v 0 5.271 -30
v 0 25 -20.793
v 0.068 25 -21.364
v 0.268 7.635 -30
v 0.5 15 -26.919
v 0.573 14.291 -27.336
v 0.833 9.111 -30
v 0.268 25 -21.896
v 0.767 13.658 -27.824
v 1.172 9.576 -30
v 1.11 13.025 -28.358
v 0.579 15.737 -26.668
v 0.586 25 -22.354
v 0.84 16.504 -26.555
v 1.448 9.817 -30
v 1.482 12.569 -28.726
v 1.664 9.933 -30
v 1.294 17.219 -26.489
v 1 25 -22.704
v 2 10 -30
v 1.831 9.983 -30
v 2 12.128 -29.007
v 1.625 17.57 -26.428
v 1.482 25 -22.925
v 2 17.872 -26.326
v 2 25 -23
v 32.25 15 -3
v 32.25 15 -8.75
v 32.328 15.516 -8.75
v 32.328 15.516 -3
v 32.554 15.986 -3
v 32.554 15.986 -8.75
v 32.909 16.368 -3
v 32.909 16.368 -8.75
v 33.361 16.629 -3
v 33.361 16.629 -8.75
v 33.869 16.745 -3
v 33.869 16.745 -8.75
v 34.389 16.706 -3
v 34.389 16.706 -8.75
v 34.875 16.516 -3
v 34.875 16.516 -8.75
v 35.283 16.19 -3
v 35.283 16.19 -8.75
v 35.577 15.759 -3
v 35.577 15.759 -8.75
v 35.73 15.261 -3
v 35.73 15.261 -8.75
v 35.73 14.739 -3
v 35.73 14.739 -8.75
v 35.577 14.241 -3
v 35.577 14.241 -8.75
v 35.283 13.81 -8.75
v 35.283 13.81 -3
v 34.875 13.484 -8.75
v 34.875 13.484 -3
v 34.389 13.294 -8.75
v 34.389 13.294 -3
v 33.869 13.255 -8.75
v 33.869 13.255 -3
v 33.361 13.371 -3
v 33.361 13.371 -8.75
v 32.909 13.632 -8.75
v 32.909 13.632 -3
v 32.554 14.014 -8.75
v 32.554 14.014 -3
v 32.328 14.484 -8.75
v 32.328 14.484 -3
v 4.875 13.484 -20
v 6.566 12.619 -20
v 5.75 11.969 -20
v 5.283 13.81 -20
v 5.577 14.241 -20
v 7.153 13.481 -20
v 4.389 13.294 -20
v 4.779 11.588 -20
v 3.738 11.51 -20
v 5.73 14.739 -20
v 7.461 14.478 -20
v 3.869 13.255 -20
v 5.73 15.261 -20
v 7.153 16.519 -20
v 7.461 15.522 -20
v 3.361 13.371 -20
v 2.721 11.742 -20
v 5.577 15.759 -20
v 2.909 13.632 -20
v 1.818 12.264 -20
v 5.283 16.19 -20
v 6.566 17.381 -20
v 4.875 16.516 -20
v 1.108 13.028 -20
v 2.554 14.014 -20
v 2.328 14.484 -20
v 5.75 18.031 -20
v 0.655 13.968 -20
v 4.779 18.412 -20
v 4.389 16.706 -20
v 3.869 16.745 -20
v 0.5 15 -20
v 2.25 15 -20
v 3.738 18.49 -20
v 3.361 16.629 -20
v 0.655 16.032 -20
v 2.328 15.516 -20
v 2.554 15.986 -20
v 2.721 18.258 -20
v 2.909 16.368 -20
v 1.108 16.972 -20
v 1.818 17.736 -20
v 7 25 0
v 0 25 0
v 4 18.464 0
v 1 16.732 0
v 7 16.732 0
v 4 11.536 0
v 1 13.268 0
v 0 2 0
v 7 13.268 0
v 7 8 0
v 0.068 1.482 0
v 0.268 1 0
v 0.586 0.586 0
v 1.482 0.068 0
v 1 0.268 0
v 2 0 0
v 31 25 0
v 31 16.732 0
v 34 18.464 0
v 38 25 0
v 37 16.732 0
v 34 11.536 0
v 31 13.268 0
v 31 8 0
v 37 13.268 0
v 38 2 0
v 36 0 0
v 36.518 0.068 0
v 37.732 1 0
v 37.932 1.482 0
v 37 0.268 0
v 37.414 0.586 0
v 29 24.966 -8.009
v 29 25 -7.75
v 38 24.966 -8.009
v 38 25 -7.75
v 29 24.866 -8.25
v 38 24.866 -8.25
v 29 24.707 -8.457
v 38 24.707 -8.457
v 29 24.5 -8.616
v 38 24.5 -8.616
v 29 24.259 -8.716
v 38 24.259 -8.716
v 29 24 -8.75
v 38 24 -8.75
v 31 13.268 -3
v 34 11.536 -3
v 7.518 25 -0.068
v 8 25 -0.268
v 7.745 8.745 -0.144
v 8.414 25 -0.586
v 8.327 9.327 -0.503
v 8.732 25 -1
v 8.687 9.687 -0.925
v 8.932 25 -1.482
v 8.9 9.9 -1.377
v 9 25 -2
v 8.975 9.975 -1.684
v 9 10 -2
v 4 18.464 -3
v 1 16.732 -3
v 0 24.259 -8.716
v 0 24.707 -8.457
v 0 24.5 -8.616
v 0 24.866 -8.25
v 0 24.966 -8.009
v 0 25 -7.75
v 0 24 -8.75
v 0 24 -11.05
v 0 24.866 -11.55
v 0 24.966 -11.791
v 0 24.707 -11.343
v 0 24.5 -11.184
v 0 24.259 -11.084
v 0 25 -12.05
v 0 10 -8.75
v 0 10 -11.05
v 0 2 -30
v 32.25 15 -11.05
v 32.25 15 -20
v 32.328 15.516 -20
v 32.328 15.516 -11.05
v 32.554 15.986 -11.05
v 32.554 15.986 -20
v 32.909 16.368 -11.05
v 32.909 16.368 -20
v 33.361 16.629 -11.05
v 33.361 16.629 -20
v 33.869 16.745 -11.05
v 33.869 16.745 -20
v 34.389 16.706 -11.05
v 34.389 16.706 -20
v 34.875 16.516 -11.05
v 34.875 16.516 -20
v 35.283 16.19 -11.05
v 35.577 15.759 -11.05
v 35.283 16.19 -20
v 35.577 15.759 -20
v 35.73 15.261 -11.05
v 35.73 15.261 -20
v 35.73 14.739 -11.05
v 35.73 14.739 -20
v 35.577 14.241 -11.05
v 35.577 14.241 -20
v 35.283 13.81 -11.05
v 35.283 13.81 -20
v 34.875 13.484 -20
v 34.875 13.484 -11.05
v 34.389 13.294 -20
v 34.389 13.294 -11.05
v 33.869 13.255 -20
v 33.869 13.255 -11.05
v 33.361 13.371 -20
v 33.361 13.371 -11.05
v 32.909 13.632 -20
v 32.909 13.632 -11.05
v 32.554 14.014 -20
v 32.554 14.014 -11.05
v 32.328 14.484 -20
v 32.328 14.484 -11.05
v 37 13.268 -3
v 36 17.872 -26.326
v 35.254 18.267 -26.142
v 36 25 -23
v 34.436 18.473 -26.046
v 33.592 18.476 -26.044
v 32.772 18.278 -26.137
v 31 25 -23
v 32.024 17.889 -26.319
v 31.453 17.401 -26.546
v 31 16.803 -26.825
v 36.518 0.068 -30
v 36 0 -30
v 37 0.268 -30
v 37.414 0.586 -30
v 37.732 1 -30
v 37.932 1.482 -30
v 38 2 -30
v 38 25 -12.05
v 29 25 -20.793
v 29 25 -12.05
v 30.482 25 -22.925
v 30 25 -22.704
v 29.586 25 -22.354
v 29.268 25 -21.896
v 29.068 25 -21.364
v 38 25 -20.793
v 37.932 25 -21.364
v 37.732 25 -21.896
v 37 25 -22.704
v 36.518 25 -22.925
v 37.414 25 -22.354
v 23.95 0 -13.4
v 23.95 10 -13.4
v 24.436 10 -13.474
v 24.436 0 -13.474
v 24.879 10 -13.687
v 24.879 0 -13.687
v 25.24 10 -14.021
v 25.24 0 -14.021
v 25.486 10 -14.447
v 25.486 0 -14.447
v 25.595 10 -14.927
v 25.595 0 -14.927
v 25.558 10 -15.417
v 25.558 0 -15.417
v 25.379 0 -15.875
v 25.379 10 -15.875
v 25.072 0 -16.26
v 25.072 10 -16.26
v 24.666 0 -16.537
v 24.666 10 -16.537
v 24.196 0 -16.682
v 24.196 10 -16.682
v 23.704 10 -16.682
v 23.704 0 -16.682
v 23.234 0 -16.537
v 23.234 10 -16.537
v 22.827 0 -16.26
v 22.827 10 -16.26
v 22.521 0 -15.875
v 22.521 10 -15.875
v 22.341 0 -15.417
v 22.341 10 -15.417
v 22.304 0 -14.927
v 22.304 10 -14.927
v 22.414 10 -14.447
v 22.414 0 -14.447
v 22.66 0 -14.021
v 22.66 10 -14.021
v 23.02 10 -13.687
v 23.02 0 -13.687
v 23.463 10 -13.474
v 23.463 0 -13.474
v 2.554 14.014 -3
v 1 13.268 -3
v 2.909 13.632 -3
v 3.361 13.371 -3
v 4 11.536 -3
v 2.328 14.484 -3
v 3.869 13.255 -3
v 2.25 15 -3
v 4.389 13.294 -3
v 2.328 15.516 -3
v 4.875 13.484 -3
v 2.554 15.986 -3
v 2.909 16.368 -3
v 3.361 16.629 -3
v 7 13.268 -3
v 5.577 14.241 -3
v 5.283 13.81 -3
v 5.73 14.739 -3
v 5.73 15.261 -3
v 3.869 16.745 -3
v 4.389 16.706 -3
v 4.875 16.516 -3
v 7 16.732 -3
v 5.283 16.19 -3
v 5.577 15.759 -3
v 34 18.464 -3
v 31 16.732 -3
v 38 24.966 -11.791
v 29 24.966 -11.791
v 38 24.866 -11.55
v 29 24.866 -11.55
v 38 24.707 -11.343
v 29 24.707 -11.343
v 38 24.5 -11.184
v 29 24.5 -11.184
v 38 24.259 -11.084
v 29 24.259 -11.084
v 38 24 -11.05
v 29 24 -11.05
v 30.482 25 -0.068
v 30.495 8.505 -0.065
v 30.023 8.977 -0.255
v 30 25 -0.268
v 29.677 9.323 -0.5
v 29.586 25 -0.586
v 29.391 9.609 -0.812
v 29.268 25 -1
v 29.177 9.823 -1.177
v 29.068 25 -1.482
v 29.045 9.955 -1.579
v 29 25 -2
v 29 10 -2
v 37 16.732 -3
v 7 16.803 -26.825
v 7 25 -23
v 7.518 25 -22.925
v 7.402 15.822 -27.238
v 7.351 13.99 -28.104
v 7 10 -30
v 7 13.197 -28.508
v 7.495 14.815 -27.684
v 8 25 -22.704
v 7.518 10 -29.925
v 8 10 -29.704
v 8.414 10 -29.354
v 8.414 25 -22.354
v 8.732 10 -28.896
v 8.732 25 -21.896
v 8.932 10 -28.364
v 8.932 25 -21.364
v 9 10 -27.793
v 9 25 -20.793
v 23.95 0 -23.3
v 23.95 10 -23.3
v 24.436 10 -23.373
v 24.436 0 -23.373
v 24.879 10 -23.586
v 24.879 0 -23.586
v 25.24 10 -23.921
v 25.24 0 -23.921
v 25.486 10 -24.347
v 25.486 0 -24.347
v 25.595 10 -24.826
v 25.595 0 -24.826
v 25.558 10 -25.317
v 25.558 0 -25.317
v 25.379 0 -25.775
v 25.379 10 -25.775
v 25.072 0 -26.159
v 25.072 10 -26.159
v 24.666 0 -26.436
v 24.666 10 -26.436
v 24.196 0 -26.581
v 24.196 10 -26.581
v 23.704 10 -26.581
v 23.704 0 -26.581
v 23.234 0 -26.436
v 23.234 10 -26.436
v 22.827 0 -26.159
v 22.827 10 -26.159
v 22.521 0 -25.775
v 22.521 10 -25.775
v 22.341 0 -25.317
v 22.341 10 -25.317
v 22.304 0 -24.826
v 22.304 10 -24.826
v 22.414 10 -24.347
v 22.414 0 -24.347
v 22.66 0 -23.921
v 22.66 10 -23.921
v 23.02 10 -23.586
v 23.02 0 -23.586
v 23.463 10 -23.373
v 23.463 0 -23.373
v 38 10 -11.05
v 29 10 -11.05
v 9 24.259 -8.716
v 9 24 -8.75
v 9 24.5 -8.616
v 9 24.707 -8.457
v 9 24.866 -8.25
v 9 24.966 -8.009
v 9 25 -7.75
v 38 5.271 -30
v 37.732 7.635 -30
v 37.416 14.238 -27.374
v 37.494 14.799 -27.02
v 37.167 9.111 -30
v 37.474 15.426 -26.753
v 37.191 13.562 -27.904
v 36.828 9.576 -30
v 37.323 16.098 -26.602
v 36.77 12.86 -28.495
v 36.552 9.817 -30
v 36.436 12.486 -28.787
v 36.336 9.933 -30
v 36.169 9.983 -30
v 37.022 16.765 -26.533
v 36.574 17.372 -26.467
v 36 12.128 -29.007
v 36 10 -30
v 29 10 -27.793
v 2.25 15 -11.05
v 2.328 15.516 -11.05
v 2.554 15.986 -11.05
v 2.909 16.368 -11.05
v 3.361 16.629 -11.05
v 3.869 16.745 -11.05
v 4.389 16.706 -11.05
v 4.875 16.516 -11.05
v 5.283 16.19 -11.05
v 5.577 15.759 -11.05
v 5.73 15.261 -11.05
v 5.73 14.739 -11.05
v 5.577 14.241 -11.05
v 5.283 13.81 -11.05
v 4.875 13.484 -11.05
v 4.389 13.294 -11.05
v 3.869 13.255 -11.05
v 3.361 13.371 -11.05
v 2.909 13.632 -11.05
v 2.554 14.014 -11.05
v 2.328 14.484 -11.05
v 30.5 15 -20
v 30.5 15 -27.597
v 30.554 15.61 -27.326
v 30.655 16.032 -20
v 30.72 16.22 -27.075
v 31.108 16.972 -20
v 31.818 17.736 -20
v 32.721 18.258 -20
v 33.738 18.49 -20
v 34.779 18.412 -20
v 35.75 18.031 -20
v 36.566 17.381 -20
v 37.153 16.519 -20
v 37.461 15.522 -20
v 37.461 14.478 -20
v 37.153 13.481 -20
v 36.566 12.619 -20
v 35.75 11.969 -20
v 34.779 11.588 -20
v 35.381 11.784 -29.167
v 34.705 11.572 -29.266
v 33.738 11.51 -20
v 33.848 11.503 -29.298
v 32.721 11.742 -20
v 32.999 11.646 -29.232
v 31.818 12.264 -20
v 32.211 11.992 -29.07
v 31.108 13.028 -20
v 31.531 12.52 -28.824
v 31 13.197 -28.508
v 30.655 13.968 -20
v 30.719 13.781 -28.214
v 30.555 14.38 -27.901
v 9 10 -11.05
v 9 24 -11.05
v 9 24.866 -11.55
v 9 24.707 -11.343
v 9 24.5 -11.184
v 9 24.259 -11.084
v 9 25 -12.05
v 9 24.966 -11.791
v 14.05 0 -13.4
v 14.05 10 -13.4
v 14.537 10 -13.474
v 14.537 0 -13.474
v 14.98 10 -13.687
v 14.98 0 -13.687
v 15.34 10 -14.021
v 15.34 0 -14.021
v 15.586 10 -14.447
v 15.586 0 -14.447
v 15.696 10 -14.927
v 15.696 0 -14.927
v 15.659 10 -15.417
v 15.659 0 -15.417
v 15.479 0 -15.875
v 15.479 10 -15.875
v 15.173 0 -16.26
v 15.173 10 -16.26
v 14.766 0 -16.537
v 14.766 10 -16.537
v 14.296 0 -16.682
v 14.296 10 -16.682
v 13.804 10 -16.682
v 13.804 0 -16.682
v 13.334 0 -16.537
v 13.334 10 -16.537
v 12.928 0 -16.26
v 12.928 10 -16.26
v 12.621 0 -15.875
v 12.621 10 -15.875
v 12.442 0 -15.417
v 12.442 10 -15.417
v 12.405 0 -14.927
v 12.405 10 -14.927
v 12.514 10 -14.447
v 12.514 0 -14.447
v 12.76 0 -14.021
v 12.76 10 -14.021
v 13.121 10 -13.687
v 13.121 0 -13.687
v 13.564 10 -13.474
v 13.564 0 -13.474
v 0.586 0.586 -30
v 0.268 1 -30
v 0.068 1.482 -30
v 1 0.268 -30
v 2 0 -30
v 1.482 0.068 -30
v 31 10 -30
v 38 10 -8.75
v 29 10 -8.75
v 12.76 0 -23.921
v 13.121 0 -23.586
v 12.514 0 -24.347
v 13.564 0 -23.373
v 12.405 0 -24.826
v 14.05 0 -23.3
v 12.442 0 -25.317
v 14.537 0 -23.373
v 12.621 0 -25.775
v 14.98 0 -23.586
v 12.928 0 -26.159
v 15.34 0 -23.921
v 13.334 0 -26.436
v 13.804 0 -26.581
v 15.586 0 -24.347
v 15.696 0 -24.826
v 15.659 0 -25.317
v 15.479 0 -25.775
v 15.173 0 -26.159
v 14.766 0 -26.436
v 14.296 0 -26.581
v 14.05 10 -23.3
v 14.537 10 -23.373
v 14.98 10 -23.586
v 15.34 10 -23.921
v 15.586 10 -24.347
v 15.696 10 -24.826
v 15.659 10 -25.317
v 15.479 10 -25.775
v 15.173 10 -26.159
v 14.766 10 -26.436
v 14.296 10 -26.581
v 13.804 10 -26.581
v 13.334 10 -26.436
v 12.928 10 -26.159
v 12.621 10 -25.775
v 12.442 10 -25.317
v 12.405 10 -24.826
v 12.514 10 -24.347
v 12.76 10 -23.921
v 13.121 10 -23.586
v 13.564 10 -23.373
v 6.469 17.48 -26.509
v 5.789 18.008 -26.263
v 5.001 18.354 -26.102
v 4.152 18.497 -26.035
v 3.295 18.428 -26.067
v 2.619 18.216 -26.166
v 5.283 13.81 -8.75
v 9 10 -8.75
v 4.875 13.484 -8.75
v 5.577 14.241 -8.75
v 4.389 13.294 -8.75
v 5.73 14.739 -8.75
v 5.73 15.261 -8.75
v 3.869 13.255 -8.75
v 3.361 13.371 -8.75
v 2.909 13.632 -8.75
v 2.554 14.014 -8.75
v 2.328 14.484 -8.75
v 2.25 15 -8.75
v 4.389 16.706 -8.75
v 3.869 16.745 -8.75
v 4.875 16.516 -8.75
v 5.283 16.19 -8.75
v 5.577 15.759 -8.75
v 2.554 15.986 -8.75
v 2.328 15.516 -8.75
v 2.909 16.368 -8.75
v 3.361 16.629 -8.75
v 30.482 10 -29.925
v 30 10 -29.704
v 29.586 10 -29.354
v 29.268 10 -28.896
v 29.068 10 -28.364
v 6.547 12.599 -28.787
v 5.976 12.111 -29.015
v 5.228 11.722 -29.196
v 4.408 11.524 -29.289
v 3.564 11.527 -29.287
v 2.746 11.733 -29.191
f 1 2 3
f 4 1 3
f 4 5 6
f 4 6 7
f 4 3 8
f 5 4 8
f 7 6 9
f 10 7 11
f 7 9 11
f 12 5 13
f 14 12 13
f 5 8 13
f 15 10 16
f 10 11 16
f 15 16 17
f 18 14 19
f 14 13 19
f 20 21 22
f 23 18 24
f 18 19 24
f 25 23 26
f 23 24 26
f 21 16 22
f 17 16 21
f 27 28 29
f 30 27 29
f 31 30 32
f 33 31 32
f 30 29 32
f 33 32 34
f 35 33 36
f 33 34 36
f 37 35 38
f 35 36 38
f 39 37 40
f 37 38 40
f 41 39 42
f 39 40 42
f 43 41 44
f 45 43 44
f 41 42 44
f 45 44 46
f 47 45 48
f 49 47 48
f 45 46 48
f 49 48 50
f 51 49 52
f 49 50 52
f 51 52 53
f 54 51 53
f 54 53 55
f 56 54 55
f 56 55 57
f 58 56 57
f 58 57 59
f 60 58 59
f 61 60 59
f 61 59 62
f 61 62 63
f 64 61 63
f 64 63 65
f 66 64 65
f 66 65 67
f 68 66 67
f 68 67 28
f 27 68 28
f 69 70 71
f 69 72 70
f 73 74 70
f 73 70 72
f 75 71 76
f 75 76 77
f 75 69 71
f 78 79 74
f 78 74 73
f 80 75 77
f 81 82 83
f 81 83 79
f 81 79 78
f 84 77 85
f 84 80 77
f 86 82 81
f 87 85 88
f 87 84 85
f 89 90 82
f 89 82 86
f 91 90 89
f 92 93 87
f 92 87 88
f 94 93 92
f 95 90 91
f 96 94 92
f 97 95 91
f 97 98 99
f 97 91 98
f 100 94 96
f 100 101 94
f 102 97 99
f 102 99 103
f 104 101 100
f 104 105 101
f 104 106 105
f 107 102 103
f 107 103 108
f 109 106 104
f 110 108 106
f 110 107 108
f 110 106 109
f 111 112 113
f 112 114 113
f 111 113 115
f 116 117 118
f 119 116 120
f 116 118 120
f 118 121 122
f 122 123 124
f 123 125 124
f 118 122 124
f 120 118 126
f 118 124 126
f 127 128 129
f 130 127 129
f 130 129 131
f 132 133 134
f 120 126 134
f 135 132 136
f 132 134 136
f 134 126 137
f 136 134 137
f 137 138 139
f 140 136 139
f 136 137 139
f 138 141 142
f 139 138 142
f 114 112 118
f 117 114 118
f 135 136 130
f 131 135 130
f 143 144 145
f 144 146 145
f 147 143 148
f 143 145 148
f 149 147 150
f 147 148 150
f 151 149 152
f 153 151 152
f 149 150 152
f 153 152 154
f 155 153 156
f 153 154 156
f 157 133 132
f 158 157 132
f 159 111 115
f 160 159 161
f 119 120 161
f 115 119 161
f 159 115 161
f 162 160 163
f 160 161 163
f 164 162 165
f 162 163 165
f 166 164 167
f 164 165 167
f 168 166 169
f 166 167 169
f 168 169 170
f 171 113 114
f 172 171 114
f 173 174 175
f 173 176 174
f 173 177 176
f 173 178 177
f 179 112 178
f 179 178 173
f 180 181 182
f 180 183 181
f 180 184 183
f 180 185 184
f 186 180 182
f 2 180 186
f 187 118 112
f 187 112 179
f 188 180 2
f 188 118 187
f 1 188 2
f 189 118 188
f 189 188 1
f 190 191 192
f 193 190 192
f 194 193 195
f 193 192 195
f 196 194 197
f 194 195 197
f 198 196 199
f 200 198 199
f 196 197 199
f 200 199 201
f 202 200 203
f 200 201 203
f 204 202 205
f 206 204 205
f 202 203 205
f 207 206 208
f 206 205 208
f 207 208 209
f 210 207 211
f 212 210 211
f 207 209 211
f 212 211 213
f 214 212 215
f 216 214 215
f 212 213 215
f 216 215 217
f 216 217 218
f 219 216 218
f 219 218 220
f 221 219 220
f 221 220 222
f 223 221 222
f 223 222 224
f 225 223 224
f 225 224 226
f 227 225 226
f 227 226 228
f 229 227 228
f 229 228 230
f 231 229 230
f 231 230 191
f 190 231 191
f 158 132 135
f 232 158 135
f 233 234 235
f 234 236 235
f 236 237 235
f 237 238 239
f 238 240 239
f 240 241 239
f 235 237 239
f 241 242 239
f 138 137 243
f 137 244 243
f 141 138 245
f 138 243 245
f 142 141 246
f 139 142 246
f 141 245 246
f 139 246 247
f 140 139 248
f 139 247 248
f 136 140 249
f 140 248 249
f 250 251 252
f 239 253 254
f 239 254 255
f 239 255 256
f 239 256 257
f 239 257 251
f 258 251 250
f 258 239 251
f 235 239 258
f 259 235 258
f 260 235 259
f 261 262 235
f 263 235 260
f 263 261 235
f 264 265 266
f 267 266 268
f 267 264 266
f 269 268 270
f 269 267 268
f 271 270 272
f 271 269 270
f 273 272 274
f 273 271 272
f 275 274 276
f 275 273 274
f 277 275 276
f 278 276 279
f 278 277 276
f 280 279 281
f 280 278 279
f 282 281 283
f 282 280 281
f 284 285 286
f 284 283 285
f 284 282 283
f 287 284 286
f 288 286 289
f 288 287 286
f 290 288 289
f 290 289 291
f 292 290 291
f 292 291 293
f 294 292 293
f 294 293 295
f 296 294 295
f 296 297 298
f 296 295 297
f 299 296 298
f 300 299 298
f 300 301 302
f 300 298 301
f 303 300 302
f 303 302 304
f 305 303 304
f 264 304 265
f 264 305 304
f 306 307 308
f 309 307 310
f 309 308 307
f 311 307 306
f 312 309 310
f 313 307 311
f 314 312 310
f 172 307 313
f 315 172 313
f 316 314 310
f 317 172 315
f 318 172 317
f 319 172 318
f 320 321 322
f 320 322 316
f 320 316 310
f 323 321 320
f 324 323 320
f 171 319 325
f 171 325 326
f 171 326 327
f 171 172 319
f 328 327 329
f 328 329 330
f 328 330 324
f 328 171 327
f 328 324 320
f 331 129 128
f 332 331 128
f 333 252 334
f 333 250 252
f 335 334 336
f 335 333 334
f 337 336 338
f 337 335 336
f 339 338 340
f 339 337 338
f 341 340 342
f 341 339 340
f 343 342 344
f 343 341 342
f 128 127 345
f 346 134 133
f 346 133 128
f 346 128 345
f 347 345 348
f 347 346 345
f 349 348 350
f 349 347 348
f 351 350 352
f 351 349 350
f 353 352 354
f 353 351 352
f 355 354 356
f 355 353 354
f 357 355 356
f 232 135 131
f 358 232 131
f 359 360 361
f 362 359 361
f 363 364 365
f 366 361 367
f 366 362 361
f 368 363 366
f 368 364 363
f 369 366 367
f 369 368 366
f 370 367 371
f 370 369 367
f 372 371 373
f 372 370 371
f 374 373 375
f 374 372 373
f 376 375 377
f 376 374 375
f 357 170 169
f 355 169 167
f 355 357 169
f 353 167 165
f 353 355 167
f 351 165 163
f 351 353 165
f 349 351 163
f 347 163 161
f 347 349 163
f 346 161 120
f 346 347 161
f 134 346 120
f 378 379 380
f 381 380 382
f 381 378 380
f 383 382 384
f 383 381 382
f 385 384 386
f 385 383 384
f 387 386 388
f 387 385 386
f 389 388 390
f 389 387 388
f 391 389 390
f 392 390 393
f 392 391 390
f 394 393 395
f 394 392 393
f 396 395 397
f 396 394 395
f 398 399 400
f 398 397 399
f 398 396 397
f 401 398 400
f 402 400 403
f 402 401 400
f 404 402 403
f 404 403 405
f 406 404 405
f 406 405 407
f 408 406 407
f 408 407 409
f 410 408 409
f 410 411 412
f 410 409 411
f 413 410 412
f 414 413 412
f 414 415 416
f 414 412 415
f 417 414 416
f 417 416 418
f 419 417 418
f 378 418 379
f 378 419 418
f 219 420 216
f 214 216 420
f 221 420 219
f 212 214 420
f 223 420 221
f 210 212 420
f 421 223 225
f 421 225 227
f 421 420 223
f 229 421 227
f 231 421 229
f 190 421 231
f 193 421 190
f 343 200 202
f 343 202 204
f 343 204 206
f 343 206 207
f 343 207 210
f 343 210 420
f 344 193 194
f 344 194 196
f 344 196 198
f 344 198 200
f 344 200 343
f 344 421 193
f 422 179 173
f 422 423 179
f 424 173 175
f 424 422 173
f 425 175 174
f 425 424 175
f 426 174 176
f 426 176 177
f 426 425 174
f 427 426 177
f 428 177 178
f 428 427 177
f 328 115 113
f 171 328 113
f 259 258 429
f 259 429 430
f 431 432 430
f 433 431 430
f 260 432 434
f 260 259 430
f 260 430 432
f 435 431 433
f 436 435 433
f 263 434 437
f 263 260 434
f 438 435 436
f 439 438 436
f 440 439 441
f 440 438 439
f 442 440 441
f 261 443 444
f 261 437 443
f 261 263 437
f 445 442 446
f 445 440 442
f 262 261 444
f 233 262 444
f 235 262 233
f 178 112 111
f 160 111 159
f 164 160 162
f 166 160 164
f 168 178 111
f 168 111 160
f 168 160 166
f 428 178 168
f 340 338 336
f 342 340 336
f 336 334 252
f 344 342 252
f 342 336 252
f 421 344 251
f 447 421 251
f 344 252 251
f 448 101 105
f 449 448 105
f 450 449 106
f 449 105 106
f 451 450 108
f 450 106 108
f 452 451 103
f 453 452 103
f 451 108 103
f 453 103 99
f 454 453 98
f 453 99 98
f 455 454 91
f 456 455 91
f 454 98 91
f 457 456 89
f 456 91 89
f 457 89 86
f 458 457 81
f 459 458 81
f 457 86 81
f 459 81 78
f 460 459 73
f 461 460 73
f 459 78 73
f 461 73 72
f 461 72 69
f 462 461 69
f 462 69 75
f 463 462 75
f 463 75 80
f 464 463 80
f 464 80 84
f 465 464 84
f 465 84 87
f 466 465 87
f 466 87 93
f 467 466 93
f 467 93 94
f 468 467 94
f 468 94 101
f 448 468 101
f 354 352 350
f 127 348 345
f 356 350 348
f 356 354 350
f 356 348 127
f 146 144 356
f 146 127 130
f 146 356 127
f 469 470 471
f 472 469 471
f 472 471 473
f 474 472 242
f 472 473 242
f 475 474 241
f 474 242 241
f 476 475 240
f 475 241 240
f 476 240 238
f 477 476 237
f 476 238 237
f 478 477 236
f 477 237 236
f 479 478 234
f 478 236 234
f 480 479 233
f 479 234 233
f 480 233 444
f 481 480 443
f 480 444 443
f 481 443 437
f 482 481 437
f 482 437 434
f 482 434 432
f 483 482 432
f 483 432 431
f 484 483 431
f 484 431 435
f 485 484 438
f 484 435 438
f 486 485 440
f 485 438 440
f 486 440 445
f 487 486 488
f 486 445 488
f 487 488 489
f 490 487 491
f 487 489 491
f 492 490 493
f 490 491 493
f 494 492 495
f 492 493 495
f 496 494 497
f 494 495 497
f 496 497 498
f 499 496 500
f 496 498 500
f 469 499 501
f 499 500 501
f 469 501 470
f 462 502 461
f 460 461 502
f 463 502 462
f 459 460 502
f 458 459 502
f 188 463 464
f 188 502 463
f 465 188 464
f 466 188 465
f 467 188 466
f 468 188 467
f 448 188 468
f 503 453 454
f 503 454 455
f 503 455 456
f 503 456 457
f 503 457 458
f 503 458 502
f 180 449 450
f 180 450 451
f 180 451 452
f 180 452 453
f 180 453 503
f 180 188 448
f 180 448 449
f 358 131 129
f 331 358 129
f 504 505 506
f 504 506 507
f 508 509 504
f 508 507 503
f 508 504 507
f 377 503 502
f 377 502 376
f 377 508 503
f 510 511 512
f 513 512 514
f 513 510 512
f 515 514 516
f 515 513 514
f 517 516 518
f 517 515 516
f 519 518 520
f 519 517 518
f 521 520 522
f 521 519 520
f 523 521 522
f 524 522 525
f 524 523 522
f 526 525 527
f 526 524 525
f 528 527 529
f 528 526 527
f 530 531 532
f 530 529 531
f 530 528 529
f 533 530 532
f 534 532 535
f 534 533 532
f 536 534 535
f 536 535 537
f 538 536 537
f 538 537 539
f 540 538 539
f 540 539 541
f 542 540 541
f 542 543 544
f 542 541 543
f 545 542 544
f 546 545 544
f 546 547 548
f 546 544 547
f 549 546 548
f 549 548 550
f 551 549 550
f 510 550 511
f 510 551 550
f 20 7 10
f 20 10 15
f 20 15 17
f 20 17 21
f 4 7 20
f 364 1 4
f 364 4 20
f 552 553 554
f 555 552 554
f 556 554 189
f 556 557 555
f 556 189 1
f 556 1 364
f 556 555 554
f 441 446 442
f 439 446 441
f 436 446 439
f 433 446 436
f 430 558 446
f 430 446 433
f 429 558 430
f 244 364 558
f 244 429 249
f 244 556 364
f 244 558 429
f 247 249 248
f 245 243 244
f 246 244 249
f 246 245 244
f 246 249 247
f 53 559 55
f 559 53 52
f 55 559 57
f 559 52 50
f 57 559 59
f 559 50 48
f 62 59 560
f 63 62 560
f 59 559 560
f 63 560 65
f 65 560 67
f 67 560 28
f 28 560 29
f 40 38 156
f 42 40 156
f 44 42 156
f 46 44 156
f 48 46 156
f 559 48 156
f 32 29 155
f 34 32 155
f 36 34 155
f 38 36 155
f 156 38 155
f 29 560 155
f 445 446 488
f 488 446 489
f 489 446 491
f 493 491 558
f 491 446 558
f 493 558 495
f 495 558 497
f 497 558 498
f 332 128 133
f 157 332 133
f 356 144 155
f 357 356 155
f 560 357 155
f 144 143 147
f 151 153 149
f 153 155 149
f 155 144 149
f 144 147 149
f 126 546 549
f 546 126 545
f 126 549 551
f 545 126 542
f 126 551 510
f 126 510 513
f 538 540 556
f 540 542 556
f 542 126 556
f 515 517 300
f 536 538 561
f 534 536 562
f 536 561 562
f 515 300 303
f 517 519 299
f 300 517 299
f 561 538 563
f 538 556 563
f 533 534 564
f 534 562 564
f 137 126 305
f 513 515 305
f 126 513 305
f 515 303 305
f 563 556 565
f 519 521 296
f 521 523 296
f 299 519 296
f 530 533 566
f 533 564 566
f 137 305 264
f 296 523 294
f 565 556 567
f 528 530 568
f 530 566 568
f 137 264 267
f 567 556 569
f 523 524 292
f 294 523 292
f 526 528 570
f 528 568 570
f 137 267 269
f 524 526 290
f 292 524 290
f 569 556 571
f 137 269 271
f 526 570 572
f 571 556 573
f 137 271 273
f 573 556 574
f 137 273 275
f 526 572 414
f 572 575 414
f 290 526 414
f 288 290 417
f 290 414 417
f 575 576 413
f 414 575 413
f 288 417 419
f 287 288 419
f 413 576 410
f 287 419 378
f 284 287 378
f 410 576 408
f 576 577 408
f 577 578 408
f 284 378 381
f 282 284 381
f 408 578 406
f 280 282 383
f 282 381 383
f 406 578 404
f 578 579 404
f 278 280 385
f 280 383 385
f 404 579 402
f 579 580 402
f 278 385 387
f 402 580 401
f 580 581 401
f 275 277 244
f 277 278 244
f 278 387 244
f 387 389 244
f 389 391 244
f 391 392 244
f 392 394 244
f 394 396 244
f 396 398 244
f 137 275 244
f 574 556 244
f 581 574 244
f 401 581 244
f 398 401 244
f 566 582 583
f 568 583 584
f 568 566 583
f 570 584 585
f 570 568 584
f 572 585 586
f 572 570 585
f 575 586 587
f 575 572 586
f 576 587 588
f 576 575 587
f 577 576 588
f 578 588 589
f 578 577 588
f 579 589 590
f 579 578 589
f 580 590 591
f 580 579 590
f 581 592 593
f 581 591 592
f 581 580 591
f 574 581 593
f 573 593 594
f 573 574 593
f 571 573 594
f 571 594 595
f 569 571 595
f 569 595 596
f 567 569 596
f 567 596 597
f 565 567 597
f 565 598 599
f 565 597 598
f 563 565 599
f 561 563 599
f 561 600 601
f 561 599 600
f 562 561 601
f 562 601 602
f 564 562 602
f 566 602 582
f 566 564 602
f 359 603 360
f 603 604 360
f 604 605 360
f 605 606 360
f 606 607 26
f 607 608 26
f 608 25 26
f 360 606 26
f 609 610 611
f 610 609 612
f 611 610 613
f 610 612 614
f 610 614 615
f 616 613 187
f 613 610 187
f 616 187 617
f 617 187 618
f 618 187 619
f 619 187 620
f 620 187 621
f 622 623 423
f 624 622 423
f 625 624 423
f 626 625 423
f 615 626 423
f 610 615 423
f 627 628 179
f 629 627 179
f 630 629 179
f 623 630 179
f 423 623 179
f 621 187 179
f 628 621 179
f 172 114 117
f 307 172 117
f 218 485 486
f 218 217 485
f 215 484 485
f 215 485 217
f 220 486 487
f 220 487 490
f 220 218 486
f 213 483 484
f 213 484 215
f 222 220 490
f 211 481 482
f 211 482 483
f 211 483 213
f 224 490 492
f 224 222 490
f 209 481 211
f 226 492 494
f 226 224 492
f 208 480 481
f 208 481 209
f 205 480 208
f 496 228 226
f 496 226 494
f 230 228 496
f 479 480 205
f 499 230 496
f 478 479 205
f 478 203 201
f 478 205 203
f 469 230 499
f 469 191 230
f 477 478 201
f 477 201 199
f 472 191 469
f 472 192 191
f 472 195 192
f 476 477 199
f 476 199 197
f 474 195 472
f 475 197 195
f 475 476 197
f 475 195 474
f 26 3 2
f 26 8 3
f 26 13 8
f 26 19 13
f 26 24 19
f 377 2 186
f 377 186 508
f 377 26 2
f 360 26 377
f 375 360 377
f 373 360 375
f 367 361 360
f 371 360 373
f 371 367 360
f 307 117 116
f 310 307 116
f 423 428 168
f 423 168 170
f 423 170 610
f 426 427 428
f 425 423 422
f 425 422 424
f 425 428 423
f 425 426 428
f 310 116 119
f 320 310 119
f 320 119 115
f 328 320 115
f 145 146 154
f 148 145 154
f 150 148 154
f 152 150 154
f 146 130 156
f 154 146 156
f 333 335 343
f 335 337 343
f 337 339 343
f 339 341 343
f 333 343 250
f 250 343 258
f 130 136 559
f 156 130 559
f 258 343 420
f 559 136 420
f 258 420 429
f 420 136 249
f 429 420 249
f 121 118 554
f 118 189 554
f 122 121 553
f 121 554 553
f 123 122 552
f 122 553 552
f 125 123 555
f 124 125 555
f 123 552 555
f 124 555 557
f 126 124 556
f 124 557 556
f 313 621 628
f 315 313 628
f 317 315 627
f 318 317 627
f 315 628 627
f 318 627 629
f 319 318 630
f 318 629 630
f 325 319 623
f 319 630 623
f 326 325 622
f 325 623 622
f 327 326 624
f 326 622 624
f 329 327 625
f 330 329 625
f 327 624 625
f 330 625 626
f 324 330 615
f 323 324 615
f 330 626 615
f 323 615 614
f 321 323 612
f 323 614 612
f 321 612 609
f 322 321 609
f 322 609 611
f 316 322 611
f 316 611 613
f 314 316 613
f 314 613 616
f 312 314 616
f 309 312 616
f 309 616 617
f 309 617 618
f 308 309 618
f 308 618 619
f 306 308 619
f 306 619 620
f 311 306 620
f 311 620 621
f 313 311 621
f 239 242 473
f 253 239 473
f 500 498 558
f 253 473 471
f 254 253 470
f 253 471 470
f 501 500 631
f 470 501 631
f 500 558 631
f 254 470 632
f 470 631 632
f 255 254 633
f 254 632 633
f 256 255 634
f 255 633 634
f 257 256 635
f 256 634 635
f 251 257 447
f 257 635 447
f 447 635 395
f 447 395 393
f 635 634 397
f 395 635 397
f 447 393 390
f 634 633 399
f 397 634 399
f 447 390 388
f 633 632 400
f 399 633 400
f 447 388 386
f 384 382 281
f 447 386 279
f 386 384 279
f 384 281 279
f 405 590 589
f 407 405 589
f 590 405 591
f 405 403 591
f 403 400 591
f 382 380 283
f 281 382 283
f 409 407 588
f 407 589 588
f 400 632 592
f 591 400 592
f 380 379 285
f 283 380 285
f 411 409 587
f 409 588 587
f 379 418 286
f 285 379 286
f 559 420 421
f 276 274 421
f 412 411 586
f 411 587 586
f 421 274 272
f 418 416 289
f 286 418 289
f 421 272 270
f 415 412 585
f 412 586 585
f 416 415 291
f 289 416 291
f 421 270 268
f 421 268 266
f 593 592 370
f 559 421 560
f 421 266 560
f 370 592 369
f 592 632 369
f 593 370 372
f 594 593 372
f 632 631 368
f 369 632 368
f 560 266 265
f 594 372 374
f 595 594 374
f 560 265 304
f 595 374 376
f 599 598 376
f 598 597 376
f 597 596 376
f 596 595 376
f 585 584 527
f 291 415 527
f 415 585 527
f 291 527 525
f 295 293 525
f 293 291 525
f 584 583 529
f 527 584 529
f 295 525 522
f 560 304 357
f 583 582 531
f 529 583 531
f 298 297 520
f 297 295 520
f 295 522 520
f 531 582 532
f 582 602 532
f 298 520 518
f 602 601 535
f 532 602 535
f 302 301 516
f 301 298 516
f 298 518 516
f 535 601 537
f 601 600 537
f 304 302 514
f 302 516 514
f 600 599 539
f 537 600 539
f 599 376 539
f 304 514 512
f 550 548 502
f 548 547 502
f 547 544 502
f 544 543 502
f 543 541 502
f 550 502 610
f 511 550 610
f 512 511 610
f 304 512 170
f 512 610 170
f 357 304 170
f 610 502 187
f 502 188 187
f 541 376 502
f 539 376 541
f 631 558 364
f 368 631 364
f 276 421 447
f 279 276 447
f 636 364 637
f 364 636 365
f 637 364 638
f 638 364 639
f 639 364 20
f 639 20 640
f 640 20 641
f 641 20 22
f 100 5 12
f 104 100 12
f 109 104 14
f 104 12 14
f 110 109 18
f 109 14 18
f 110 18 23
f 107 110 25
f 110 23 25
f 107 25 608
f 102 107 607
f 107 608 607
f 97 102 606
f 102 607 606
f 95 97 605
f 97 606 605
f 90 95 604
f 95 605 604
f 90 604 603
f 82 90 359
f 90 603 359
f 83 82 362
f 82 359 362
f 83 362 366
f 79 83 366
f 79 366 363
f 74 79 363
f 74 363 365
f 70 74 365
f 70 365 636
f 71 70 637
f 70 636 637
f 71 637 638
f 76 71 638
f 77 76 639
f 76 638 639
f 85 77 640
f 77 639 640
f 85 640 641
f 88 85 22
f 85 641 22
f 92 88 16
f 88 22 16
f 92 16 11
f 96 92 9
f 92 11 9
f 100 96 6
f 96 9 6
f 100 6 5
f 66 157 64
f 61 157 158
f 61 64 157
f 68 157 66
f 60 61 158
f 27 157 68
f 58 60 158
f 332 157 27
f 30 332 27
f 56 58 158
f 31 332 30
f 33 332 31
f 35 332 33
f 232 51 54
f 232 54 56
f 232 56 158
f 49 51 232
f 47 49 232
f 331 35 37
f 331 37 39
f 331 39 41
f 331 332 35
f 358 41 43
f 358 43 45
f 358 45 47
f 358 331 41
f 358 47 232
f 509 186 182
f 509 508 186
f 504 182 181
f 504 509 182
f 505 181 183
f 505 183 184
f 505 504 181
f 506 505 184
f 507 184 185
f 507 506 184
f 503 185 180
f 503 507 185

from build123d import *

# Parameters (mm, degrees)
SKETCH_1_W             = 38
SKETCH_1_H             = 30
SKETCH_1_R             = 1.65
EXTRUDE_694_DEPTH      = 25
SKETCH_3_W             = 20
SKETCH_3_H             = 30
CUT_EXTRUDE_926_DEPTH  = 15
SKETCH_4_W             = 2.3
SKETCH_4_H             = 15
CUT_EXTRUDE_1406_DEPTH = 55.488530903
FILLET_3_R             = 1
FILLET_4_R             = 2
SKETCH_6_R             = 1.75
CUT_EXTRUDE_2902_DEPTH = 55.488530903
SKETCH_7_R             = 3.5
CUT_EXTRUDE_3145_DEPTH = 10
CUT_EXTRUDE_3527_DEPTH = 3


with BuildPart() as part:
    # Эскиз1 → Extrude 694 (new body)
    with BuildSketch(Plane(origin=(0, 0, 0), x_dir=(1, 0, 0), z_dir=(0, 1, 0))):
        with Locations((19, 15)):
            Rectangle(SKETCH_1_W, SKETCH_1_H)
        with Locations(Location((14.050252532, 24.949747468, 0), (0, 0, 270))):
            Circle(SKETCH_1_R, mode=Mode.SUBTRACT)
        with Locations(Location((23.949747468, 24.949747468, 0), (0, 0, 270))):
            Circle(SKETCH_1_R, mode=Mode.SUBTRACT)
        with Locations(Location((23.949747468, 15.050252532, 0), (0, 0, 270))):
            Circle(SKETCH_1_R, mode=Mode.SUBTRACT)
        with Locations(Location((14.050252532, 15.050252532, 0), (0, 0, 270))):
            Circle(SKETCH_1_R, mode=Mode.SUBTRACT)
    extrude(amount=EXTRUDE_694_DEPTH)

    # Эскиз3 → Cut-Extrude 926 (cut)
    with BuildSketch(Plane(origin=(0, 25, 0), x_dir=(1, 0, 0), z_dir=(0, 1, 0))):
        with Locations((19, 15)):
            Rectangle(SKETCH_3_W, SKETCH_3_H)
    extrude(amount=-CUT_EXTRUDE_926_DEPTH, mode=Mode.SUBTRACT)

    # Эскиз4 → Cut-Extrude 1406 (cut, through all)
    with BuildSketch(Plane.ZY):
        Polygon((-30, 10), (-23, 25), (-30, 25), align=None)
        with Locations((-9.900252532, 17.5)):
            Rectangle(SKETCH_4_W, SKETCH_4_H)
    extrude(amount=-CUT_EXTRUDE_1406_DEPTH, mode=Mode.SUBTRACT)

    # Скругление3
    fillet_3_edges = [part.edges().sort_by_distance(p)[0] for p in [
        (4.5, 25, -11.050252532),
        (33.5, 25, -11.050252532),
        (4.5, 25, -8.750252532),
        (33.5, 25, -8.750252532),
    ]]
    fillet(fillet_3_edges, radius=FILLET_3_R)

    # Скругление4
    fillet_4_edges = [part.edges().sort_by_distance(p)[0] for p in [
        (9, 17.5, 0),
        (19, 10, 0),
        (29, 17.5, 0),
        (38, 0, -15),
        (0, 0, -15),
        (9, 17.5, -26.5),
        (29, 17.5, -26.5),
        (38, 17.5, -26.5),
        (0, 17.5, -26.5),
    ]]
    fillet(fillet_4_edges, radius=FILLET_4_R)

    # Эскиз6 → Cut-Extrude 2902 (cut, through all)
    with BuildSketch(Plane(origin=(0, 0, -30), x_dir=(-1, 0, 0), z_dir=(0, 0, -1))):
        with Locations((-34, 15)):
            Circle(SKETCH_6_R)
        with Locations((-4, 15)):
            Circle(SKETCH_6_R)
    extrude(amount=-CUT_EXTRUDE_2902_DEPTH, mode=Mode.SUBTRACT)

    # Эскиз7 → Cut-Extrude 3145 (cut)
    with BuildSketch(Plane(origin=(0, 0, -30), x_dir=(-1, 0, 0), z_dir=(0, 0, -1))):
        with Locations((-34, 15)):
            Circle(SKETCH_7_R)
        with Locations((-4, 15)):
            Circle(SKETCH_7_R)
    extrude(amount=-CUT_EXTRUDE_3145_DEPTH, mode=Mode.SUBTRACT)

    # Эскиз8 → Cut-Extrude 3527 (cut)
    with BuildSketch(Plane.XY):
        Polygon((7, 13.267949192), (7, 16.732050808), (4, 18.464101615), (1, 16.732050808), (1, 13.267949192), (4, 11.535898385), align=None)
        Polygon((34, 18.464101615), (31, 16.732050808), (31, 13.267949192), (34, 11.535898385), (37, 13.267949192), (37, 16.732050808), align=None)
    extrude(amount=-CUT_EXTRUDE_3527_DEPTH, mode=Mode.SUBTRACT)


solid = part.part
